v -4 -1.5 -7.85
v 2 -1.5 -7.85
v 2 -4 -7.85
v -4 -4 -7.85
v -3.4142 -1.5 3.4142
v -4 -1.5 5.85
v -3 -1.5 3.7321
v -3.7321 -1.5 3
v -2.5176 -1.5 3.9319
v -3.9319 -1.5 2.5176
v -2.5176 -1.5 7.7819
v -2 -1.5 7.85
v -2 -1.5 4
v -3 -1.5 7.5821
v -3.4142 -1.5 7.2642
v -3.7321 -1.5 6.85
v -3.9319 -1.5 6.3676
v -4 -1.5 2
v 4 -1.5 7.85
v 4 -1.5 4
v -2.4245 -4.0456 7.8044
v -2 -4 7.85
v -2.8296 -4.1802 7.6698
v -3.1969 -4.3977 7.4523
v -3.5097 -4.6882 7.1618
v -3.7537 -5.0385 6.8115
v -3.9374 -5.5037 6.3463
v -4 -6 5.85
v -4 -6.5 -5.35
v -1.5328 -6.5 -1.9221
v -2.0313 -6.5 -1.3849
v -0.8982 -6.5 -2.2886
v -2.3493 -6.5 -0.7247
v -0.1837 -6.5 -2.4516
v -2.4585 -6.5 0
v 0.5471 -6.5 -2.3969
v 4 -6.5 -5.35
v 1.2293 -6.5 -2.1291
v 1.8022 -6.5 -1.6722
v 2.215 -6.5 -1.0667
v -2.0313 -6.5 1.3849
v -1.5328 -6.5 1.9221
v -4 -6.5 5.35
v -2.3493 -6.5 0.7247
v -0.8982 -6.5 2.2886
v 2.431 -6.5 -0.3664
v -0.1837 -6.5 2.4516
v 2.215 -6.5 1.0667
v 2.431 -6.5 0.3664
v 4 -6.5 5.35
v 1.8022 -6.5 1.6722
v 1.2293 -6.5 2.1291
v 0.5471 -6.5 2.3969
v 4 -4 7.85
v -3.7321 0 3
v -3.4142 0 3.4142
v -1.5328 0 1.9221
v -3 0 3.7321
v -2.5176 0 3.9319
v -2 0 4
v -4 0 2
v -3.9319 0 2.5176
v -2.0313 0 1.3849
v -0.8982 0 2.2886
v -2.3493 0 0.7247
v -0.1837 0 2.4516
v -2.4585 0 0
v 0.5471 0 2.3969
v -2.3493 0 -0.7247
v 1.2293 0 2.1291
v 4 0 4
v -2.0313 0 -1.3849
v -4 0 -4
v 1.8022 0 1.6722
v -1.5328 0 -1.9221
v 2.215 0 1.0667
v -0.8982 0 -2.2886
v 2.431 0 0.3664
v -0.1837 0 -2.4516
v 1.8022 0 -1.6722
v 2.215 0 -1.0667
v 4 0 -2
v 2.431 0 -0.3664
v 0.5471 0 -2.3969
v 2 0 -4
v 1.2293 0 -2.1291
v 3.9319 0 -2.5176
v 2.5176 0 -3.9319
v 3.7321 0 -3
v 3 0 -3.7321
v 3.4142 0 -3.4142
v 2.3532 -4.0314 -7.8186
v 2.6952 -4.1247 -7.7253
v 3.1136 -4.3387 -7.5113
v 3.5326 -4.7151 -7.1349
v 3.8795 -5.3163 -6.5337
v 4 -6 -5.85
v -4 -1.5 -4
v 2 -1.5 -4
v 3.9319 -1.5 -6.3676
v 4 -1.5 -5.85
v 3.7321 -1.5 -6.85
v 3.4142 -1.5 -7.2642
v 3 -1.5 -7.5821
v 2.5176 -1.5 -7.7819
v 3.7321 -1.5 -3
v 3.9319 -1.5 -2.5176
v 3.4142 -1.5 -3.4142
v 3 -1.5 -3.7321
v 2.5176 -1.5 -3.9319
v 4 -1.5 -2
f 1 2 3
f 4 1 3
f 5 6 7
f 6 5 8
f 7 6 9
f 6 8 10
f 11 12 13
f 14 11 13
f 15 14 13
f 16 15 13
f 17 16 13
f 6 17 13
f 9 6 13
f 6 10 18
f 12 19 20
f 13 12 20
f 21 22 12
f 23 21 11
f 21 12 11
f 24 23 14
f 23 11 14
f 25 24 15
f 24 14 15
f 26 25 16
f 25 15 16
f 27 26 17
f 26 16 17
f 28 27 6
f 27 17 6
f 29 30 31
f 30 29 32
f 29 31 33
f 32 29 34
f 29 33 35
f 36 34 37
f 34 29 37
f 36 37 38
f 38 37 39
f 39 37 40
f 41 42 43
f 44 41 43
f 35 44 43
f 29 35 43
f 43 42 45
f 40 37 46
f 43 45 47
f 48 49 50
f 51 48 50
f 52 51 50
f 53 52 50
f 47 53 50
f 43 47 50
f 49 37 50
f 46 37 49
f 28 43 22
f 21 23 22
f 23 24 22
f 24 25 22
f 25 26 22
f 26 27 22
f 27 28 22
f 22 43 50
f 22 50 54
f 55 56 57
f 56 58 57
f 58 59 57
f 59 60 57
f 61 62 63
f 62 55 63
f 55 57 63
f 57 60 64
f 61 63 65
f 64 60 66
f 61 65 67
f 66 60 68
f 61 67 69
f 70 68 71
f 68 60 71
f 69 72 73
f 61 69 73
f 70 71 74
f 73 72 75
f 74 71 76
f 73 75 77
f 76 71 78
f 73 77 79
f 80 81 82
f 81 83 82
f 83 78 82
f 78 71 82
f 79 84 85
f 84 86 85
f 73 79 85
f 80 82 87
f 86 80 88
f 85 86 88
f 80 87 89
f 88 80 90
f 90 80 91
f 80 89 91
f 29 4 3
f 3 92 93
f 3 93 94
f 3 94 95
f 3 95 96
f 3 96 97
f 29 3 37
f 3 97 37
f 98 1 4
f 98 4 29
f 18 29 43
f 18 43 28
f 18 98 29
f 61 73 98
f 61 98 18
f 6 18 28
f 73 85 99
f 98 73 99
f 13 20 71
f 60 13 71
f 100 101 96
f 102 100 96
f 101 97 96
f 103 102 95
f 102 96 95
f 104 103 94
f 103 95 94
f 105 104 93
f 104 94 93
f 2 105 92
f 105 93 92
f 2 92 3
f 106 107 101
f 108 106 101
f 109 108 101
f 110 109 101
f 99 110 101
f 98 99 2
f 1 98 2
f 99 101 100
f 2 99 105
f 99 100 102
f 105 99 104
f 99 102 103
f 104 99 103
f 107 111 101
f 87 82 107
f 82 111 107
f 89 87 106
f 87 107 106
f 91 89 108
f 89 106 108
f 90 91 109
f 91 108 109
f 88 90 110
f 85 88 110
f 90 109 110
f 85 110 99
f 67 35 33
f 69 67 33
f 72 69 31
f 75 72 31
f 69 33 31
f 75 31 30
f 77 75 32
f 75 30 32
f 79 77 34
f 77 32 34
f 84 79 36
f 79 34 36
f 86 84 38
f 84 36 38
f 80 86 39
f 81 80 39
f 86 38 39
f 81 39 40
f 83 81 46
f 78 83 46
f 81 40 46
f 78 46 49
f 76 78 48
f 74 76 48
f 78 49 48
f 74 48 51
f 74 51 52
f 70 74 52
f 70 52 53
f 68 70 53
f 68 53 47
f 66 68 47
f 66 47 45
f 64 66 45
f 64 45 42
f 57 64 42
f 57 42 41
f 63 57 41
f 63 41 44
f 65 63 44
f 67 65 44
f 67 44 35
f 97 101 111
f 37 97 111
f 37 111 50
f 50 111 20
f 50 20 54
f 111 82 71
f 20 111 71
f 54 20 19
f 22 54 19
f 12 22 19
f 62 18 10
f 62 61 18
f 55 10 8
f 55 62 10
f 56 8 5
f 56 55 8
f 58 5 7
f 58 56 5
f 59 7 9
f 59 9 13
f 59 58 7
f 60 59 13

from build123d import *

# Parameters (mm, degrees)
BOSS_EXTRUDE1_DEPTH = 4
FILLET1_R           = 2
TAP1_D              = 4.917


with BuildPart() as part:
    # Sketch1 → Boss-Extrude1 (new, symmetric)
    with BuildSketch(Plane(origin=(0, 0, 0), x_dir=(0, 0, -1), z_dir=(1, 0, 0))):
        Polygon((-4, 0), (4, 0), (4, -1.5), (7.85, -1.5), (7.85, -4), (5.35, -6.5), (-5.35, -6.5), (-7.85, -4), (-7.85, -1.5), (-4, -1.5), align=None)
    extrude(amount=BOSS_EXTRUDE1_DEPTH, both=True)

    # Fillet1
    fillet1_edges = [part.edges().sort_by_distance(p)[0] for p in [
        (-4, -2.75, 7.85),
        (-4, -0.75, 4),
        (4, -2.75, -7.85),
        (4, -0.75, -4),
    ]]
    fillet(fillet1_edges, radius=FILLET1_R)

    # Tap1 (through all)
    with Locations(Plane(origin=(0, 0, 0), x_dir=(1, 0, 0), z_dir=(0, 1, 0))):
        with Locations((0, 0)):
            Hole(TAP1_D / 2)


solid = part.part
